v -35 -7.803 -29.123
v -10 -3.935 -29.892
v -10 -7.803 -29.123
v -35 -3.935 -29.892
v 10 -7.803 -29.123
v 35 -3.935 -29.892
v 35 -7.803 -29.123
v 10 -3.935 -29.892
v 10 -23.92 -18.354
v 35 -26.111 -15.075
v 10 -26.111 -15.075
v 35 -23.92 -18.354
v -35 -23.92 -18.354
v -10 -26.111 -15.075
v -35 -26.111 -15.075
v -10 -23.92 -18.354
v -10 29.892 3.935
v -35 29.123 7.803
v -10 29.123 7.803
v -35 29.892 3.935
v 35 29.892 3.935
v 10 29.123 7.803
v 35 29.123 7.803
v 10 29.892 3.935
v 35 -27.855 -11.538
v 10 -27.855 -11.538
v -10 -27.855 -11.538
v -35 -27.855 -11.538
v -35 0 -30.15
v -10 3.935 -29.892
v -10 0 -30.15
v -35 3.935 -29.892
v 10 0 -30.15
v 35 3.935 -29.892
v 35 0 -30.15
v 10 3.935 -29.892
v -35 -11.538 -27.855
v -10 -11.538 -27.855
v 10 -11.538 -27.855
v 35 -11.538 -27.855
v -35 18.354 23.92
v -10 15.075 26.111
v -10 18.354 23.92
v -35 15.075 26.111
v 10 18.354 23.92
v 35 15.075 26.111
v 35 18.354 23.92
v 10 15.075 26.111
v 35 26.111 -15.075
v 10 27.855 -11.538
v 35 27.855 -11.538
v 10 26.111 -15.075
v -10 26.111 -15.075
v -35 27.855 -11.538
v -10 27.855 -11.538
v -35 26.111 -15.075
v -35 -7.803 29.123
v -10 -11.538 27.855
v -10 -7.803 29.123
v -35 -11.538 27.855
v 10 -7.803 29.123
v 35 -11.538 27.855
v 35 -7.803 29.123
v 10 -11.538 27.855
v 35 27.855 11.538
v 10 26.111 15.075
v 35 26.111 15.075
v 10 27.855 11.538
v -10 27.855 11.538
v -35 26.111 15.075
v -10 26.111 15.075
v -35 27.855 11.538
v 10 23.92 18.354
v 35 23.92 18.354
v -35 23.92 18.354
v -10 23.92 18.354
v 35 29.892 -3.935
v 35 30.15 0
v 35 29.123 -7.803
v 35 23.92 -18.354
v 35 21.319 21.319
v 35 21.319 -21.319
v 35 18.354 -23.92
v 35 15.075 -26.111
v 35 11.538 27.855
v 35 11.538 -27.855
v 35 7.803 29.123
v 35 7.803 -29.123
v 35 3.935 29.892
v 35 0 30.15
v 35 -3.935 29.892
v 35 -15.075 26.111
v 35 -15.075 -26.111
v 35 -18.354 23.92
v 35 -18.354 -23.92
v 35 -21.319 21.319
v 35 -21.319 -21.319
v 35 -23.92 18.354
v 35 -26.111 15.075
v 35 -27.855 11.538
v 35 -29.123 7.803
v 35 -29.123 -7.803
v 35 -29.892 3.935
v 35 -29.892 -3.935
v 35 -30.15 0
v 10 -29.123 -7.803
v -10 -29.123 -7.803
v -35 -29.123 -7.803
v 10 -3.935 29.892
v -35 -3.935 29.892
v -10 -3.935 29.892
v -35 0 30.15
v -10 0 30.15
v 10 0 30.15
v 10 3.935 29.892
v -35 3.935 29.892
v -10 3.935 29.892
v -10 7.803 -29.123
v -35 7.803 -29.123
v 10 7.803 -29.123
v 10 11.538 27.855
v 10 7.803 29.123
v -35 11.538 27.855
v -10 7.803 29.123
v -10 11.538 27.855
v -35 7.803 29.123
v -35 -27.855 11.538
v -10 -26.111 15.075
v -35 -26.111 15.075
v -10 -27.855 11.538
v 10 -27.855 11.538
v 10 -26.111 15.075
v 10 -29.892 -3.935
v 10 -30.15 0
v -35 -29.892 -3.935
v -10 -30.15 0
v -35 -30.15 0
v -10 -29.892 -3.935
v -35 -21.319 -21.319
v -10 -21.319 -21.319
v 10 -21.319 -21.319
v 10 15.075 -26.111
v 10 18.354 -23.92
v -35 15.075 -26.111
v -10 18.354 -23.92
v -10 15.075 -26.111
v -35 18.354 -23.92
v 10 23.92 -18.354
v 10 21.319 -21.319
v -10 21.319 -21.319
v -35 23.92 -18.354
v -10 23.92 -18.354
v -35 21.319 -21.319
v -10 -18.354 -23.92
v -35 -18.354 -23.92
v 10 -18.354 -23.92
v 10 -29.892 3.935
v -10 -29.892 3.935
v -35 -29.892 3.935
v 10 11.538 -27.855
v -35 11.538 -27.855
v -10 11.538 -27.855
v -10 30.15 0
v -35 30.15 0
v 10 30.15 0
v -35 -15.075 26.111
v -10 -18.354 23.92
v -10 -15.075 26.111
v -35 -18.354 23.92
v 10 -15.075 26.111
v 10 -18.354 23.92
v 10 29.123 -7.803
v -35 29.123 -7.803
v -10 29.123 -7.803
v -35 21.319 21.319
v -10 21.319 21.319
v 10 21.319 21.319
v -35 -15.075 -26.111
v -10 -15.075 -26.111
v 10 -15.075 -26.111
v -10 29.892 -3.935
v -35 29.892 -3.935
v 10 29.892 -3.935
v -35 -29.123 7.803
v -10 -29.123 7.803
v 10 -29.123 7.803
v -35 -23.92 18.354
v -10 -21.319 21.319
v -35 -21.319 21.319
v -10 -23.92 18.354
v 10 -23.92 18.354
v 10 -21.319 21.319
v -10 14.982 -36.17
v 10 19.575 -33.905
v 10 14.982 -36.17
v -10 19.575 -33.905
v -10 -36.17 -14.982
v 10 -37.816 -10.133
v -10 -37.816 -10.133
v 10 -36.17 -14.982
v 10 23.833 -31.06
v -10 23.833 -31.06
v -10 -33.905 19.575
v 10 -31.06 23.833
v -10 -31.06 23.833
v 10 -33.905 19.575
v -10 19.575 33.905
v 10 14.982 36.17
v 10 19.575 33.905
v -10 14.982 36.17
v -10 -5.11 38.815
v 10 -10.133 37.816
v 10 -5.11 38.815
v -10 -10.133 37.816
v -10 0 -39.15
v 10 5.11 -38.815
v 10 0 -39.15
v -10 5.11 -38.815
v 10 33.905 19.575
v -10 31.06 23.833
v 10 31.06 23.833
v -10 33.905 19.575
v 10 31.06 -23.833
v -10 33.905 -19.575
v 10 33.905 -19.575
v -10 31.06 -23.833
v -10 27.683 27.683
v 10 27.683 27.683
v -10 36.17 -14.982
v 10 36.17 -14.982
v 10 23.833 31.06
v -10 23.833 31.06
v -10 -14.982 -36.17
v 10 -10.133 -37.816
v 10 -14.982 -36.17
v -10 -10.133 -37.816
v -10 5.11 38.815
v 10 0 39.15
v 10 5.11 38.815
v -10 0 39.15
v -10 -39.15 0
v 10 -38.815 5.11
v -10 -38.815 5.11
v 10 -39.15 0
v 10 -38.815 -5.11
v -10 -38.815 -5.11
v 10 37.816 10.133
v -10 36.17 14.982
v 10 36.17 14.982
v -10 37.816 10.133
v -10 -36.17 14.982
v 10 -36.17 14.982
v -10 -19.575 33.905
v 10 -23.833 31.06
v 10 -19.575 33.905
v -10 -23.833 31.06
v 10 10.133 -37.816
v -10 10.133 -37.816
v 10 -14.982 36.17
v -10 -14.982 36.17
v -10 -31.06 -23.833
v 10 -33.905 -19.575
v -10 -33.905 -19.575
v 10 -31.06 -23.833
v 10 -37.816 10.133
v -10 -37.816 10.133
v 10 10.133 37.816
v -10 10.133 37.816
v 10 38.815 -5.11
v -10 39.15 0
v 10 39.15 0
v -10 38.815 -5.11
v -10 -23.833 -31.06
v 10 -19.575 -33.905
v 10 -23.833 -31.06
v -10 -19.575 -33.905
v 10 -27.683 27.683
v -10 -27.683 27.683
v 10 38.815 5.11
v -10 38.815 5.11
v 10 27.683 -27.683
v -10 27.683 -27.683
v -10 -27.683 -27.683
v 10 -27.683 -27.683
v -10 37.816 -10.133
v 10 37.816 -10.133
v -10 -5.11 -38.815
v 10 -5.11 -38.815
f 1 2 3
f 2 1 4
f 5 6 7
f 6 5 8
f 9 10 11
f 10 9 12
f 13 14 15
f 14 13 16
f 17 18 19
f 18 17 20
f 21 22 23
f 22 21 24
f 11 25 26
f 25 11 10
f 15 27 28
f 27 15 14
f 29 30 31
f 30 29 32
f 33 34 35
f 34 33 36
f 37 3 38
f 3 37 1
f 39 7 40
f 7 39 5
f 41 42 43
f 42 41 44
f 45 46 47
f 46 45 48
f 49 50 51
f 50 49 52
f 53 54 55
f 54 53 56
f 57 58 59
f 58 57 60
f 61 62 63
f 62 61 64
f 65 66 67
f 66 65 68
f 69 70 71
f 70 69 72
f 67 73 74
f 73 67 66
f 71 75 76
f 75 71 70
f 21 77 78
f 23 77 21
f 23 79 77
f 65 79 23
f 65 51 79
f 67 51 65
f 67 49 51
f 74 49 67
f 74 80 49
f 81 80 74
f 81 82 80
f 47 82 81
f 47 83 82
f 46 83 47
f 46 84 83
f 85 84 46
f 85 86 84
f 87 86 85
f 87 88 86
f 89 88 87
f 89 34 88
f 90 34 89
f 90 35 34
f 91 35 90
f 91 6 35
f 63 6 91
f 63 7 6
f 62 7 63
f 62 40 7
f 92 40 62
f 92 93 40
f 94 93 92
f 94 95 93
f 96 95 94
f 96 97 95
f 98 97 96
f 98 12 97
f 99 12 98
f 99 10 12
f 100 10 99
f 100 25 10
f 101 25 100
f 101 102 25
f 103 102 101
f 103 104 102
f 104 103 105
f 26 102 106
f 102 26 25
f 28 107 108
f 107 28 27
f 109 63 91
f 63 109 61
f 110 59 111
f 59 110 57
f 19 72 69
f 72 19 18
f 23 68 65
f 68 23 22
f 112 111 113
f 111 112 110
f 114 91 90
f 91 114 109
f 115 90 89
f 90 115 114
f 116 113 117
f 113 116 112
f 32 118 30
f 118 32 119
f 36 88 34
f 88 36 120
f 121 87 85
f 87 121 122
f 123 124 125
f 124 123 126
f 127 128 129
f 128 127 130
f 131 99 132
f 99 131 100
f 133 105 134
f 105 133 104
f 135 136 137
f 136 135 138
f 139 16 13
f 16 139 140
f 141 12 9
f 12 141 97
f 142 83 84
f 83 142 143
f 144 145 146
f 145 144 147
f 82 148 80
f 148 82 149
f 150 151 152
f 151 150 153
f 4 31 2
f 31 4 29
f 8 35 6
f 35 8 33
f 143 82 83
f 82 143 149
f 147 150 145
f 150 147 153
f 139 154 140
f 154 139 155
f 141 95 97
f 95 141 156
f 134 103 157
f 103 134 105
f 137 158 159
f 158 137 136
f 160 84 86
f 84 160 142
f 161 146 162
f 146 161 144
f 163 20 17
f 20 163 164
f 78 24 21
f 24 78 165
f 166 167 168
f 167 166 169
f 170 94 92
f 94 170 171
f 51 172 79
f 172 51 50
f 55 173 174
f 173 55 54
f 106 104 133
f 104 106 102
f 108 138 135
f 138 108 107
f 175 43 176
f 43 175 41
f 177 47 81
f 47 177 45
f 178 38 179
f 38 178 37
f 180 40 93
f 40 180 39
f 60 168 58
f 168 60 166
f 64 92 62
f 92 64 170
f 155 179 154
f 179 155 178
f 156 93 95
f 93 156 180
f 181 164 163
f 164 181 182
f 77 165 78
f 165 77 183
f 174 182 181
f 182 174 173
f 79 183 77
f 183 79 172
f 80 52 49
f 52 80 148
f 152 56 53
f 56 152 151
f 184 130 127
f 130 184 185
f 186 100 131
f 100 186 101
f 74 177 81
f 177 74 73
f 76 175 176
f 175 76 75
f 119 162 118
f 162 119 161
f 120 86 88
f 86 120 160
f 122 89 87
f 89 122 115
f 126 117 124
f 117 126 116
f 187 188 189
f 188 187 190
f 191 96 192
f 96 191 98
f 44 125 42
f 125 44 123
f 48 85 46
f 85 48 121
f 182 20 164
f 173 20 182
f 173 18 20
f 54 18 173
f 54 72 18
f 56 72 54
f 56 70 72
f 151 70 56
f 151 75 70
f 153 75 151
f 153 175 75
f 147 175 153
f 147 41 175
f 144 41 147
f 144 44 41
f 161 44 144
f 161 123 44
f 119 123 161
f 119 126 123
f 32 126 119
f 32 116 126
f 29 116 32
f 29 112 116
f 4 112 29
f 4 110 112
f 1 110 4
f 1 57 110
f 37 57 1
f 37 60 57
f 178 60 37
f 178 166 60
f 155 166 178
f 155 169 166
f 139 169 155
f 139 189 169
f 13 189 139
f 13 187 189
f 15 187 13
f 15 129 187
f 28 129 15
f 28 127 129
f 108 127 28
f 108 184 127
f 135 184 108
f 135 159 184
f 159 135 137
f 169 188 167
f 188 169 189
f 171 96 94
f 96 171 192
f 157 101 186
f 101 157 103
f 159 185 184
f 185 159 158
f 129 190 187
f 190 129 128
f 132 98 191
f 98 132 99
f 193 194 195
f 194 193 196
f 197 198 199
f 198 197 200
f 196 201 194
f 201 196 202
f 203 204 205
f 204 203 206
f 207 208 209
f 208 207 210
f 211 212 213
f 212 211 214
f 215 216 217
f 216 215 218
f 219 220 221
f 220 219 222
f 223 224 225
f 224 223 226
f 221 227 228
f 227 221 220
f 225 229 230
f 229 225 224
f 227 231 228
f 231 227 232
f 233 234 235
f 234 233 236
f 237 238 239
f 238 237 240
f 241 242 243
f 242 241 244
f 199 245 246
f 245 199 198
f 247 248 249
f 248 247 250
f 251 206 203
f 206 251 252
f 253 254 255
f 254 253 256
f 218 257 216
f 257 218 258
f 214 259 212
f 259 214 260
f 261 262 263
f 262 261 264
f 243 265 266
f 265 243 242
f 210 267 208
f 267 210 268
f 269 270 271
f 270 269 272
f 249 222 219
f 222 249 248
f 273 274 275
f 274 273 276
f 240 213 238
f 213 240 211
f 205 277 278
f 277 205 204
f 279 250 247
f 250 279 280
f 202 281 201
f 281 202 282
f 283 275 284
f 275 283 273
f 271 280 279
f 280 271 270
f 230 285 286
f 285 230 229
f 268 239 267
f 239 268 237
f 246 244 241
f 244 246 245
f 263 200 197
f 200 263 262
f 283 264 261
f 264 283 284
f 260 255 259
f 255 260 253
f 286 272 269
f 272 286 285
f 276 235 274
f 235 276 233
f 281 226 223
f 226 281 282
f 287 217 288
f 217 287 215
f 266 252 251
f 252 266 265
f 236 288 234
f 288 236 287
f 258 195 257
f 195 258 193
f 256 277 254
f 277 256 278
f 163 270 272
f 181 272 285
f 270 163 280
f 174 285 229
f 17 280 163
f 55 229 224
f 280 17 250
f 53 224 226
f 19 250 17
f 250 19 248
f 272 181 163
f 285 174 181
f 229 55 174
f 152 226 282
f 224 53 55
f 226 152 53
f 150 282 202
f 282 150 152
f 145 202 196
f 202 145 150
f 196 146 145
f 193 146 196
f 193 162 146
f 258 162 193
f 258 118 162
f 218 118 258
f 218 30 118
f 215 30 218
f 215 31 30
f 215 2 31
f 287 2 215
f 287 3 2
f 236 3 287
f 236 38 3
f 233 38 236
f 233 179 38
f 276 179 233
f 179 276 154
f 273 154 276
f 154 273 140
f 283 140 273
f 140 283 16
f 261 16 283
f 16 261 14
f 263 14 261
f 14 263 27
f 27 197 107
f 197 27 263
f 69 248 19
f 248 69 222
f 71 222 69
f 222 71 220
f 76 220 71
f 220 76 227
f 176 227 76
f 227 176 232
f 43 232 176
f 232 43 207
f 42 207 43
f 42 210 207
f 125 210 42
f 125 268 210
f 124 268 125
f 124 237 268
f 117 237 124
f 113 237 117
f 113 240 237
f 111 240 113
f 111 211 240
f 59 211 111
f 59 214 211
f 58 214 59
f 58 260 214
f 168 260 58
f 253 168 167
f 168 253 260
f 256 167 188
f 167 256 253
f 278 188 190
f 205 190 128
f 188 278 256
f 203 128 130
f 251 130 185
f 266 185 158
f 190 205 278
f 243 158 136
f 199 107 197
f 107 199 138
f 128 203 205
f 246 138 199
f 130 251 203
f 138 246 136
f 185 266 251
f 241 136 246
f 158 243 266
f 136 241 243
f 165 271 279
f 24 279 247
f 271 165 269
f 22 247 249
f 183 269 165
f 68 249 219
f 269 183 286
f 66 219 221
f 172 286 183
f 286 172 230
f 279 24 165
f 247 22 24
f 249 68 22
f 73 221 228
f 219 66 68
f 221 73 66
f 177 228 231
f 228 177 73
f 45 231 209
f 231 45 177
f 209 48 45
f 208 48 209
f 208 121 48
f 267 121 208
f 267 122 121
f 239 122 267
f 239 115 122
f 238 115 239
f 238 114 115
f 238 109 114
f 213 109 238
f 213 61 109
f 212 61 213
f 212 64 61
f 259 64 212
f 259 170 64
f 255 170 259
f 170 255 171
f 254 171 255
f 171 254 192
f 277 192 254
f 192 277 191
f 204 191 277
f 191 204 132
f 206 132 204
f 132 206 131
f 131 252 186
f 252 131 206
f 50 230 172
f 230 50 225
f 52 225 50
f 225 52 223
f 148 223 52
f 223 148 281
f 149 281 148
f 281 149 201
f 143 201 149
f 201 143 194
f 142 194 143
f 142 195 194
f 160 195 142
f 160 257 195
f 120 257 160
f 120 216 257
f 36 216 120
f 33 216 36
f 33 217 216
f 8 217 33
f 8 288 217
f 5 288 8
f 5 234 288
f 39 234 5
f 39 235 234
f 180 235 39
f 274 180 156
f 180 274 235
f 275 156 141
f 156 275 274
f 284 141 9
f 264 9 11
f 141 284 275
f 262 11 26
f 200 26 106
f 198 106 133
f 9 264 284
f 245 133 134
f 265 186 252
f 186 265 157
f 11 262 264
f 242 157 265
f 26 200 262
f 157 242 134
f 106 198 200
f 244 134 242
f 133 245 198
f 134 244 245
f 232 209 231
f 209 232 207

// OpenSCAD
// Grooved union coupling (two halves + ring).
od = 60.3;
body_l = 70;
ring_d = od + 18;
ring_h = 20;
union() {
    rotate([0, 90, 0])
        cylinder(h = body_l, d = od, center = true, $fn = 48);
    // Outer ring at midpoint
    rotate([0, 90, 0])
        cylinder(h = ring_h, d = ring_d, center = true, $fn = 48);
}
